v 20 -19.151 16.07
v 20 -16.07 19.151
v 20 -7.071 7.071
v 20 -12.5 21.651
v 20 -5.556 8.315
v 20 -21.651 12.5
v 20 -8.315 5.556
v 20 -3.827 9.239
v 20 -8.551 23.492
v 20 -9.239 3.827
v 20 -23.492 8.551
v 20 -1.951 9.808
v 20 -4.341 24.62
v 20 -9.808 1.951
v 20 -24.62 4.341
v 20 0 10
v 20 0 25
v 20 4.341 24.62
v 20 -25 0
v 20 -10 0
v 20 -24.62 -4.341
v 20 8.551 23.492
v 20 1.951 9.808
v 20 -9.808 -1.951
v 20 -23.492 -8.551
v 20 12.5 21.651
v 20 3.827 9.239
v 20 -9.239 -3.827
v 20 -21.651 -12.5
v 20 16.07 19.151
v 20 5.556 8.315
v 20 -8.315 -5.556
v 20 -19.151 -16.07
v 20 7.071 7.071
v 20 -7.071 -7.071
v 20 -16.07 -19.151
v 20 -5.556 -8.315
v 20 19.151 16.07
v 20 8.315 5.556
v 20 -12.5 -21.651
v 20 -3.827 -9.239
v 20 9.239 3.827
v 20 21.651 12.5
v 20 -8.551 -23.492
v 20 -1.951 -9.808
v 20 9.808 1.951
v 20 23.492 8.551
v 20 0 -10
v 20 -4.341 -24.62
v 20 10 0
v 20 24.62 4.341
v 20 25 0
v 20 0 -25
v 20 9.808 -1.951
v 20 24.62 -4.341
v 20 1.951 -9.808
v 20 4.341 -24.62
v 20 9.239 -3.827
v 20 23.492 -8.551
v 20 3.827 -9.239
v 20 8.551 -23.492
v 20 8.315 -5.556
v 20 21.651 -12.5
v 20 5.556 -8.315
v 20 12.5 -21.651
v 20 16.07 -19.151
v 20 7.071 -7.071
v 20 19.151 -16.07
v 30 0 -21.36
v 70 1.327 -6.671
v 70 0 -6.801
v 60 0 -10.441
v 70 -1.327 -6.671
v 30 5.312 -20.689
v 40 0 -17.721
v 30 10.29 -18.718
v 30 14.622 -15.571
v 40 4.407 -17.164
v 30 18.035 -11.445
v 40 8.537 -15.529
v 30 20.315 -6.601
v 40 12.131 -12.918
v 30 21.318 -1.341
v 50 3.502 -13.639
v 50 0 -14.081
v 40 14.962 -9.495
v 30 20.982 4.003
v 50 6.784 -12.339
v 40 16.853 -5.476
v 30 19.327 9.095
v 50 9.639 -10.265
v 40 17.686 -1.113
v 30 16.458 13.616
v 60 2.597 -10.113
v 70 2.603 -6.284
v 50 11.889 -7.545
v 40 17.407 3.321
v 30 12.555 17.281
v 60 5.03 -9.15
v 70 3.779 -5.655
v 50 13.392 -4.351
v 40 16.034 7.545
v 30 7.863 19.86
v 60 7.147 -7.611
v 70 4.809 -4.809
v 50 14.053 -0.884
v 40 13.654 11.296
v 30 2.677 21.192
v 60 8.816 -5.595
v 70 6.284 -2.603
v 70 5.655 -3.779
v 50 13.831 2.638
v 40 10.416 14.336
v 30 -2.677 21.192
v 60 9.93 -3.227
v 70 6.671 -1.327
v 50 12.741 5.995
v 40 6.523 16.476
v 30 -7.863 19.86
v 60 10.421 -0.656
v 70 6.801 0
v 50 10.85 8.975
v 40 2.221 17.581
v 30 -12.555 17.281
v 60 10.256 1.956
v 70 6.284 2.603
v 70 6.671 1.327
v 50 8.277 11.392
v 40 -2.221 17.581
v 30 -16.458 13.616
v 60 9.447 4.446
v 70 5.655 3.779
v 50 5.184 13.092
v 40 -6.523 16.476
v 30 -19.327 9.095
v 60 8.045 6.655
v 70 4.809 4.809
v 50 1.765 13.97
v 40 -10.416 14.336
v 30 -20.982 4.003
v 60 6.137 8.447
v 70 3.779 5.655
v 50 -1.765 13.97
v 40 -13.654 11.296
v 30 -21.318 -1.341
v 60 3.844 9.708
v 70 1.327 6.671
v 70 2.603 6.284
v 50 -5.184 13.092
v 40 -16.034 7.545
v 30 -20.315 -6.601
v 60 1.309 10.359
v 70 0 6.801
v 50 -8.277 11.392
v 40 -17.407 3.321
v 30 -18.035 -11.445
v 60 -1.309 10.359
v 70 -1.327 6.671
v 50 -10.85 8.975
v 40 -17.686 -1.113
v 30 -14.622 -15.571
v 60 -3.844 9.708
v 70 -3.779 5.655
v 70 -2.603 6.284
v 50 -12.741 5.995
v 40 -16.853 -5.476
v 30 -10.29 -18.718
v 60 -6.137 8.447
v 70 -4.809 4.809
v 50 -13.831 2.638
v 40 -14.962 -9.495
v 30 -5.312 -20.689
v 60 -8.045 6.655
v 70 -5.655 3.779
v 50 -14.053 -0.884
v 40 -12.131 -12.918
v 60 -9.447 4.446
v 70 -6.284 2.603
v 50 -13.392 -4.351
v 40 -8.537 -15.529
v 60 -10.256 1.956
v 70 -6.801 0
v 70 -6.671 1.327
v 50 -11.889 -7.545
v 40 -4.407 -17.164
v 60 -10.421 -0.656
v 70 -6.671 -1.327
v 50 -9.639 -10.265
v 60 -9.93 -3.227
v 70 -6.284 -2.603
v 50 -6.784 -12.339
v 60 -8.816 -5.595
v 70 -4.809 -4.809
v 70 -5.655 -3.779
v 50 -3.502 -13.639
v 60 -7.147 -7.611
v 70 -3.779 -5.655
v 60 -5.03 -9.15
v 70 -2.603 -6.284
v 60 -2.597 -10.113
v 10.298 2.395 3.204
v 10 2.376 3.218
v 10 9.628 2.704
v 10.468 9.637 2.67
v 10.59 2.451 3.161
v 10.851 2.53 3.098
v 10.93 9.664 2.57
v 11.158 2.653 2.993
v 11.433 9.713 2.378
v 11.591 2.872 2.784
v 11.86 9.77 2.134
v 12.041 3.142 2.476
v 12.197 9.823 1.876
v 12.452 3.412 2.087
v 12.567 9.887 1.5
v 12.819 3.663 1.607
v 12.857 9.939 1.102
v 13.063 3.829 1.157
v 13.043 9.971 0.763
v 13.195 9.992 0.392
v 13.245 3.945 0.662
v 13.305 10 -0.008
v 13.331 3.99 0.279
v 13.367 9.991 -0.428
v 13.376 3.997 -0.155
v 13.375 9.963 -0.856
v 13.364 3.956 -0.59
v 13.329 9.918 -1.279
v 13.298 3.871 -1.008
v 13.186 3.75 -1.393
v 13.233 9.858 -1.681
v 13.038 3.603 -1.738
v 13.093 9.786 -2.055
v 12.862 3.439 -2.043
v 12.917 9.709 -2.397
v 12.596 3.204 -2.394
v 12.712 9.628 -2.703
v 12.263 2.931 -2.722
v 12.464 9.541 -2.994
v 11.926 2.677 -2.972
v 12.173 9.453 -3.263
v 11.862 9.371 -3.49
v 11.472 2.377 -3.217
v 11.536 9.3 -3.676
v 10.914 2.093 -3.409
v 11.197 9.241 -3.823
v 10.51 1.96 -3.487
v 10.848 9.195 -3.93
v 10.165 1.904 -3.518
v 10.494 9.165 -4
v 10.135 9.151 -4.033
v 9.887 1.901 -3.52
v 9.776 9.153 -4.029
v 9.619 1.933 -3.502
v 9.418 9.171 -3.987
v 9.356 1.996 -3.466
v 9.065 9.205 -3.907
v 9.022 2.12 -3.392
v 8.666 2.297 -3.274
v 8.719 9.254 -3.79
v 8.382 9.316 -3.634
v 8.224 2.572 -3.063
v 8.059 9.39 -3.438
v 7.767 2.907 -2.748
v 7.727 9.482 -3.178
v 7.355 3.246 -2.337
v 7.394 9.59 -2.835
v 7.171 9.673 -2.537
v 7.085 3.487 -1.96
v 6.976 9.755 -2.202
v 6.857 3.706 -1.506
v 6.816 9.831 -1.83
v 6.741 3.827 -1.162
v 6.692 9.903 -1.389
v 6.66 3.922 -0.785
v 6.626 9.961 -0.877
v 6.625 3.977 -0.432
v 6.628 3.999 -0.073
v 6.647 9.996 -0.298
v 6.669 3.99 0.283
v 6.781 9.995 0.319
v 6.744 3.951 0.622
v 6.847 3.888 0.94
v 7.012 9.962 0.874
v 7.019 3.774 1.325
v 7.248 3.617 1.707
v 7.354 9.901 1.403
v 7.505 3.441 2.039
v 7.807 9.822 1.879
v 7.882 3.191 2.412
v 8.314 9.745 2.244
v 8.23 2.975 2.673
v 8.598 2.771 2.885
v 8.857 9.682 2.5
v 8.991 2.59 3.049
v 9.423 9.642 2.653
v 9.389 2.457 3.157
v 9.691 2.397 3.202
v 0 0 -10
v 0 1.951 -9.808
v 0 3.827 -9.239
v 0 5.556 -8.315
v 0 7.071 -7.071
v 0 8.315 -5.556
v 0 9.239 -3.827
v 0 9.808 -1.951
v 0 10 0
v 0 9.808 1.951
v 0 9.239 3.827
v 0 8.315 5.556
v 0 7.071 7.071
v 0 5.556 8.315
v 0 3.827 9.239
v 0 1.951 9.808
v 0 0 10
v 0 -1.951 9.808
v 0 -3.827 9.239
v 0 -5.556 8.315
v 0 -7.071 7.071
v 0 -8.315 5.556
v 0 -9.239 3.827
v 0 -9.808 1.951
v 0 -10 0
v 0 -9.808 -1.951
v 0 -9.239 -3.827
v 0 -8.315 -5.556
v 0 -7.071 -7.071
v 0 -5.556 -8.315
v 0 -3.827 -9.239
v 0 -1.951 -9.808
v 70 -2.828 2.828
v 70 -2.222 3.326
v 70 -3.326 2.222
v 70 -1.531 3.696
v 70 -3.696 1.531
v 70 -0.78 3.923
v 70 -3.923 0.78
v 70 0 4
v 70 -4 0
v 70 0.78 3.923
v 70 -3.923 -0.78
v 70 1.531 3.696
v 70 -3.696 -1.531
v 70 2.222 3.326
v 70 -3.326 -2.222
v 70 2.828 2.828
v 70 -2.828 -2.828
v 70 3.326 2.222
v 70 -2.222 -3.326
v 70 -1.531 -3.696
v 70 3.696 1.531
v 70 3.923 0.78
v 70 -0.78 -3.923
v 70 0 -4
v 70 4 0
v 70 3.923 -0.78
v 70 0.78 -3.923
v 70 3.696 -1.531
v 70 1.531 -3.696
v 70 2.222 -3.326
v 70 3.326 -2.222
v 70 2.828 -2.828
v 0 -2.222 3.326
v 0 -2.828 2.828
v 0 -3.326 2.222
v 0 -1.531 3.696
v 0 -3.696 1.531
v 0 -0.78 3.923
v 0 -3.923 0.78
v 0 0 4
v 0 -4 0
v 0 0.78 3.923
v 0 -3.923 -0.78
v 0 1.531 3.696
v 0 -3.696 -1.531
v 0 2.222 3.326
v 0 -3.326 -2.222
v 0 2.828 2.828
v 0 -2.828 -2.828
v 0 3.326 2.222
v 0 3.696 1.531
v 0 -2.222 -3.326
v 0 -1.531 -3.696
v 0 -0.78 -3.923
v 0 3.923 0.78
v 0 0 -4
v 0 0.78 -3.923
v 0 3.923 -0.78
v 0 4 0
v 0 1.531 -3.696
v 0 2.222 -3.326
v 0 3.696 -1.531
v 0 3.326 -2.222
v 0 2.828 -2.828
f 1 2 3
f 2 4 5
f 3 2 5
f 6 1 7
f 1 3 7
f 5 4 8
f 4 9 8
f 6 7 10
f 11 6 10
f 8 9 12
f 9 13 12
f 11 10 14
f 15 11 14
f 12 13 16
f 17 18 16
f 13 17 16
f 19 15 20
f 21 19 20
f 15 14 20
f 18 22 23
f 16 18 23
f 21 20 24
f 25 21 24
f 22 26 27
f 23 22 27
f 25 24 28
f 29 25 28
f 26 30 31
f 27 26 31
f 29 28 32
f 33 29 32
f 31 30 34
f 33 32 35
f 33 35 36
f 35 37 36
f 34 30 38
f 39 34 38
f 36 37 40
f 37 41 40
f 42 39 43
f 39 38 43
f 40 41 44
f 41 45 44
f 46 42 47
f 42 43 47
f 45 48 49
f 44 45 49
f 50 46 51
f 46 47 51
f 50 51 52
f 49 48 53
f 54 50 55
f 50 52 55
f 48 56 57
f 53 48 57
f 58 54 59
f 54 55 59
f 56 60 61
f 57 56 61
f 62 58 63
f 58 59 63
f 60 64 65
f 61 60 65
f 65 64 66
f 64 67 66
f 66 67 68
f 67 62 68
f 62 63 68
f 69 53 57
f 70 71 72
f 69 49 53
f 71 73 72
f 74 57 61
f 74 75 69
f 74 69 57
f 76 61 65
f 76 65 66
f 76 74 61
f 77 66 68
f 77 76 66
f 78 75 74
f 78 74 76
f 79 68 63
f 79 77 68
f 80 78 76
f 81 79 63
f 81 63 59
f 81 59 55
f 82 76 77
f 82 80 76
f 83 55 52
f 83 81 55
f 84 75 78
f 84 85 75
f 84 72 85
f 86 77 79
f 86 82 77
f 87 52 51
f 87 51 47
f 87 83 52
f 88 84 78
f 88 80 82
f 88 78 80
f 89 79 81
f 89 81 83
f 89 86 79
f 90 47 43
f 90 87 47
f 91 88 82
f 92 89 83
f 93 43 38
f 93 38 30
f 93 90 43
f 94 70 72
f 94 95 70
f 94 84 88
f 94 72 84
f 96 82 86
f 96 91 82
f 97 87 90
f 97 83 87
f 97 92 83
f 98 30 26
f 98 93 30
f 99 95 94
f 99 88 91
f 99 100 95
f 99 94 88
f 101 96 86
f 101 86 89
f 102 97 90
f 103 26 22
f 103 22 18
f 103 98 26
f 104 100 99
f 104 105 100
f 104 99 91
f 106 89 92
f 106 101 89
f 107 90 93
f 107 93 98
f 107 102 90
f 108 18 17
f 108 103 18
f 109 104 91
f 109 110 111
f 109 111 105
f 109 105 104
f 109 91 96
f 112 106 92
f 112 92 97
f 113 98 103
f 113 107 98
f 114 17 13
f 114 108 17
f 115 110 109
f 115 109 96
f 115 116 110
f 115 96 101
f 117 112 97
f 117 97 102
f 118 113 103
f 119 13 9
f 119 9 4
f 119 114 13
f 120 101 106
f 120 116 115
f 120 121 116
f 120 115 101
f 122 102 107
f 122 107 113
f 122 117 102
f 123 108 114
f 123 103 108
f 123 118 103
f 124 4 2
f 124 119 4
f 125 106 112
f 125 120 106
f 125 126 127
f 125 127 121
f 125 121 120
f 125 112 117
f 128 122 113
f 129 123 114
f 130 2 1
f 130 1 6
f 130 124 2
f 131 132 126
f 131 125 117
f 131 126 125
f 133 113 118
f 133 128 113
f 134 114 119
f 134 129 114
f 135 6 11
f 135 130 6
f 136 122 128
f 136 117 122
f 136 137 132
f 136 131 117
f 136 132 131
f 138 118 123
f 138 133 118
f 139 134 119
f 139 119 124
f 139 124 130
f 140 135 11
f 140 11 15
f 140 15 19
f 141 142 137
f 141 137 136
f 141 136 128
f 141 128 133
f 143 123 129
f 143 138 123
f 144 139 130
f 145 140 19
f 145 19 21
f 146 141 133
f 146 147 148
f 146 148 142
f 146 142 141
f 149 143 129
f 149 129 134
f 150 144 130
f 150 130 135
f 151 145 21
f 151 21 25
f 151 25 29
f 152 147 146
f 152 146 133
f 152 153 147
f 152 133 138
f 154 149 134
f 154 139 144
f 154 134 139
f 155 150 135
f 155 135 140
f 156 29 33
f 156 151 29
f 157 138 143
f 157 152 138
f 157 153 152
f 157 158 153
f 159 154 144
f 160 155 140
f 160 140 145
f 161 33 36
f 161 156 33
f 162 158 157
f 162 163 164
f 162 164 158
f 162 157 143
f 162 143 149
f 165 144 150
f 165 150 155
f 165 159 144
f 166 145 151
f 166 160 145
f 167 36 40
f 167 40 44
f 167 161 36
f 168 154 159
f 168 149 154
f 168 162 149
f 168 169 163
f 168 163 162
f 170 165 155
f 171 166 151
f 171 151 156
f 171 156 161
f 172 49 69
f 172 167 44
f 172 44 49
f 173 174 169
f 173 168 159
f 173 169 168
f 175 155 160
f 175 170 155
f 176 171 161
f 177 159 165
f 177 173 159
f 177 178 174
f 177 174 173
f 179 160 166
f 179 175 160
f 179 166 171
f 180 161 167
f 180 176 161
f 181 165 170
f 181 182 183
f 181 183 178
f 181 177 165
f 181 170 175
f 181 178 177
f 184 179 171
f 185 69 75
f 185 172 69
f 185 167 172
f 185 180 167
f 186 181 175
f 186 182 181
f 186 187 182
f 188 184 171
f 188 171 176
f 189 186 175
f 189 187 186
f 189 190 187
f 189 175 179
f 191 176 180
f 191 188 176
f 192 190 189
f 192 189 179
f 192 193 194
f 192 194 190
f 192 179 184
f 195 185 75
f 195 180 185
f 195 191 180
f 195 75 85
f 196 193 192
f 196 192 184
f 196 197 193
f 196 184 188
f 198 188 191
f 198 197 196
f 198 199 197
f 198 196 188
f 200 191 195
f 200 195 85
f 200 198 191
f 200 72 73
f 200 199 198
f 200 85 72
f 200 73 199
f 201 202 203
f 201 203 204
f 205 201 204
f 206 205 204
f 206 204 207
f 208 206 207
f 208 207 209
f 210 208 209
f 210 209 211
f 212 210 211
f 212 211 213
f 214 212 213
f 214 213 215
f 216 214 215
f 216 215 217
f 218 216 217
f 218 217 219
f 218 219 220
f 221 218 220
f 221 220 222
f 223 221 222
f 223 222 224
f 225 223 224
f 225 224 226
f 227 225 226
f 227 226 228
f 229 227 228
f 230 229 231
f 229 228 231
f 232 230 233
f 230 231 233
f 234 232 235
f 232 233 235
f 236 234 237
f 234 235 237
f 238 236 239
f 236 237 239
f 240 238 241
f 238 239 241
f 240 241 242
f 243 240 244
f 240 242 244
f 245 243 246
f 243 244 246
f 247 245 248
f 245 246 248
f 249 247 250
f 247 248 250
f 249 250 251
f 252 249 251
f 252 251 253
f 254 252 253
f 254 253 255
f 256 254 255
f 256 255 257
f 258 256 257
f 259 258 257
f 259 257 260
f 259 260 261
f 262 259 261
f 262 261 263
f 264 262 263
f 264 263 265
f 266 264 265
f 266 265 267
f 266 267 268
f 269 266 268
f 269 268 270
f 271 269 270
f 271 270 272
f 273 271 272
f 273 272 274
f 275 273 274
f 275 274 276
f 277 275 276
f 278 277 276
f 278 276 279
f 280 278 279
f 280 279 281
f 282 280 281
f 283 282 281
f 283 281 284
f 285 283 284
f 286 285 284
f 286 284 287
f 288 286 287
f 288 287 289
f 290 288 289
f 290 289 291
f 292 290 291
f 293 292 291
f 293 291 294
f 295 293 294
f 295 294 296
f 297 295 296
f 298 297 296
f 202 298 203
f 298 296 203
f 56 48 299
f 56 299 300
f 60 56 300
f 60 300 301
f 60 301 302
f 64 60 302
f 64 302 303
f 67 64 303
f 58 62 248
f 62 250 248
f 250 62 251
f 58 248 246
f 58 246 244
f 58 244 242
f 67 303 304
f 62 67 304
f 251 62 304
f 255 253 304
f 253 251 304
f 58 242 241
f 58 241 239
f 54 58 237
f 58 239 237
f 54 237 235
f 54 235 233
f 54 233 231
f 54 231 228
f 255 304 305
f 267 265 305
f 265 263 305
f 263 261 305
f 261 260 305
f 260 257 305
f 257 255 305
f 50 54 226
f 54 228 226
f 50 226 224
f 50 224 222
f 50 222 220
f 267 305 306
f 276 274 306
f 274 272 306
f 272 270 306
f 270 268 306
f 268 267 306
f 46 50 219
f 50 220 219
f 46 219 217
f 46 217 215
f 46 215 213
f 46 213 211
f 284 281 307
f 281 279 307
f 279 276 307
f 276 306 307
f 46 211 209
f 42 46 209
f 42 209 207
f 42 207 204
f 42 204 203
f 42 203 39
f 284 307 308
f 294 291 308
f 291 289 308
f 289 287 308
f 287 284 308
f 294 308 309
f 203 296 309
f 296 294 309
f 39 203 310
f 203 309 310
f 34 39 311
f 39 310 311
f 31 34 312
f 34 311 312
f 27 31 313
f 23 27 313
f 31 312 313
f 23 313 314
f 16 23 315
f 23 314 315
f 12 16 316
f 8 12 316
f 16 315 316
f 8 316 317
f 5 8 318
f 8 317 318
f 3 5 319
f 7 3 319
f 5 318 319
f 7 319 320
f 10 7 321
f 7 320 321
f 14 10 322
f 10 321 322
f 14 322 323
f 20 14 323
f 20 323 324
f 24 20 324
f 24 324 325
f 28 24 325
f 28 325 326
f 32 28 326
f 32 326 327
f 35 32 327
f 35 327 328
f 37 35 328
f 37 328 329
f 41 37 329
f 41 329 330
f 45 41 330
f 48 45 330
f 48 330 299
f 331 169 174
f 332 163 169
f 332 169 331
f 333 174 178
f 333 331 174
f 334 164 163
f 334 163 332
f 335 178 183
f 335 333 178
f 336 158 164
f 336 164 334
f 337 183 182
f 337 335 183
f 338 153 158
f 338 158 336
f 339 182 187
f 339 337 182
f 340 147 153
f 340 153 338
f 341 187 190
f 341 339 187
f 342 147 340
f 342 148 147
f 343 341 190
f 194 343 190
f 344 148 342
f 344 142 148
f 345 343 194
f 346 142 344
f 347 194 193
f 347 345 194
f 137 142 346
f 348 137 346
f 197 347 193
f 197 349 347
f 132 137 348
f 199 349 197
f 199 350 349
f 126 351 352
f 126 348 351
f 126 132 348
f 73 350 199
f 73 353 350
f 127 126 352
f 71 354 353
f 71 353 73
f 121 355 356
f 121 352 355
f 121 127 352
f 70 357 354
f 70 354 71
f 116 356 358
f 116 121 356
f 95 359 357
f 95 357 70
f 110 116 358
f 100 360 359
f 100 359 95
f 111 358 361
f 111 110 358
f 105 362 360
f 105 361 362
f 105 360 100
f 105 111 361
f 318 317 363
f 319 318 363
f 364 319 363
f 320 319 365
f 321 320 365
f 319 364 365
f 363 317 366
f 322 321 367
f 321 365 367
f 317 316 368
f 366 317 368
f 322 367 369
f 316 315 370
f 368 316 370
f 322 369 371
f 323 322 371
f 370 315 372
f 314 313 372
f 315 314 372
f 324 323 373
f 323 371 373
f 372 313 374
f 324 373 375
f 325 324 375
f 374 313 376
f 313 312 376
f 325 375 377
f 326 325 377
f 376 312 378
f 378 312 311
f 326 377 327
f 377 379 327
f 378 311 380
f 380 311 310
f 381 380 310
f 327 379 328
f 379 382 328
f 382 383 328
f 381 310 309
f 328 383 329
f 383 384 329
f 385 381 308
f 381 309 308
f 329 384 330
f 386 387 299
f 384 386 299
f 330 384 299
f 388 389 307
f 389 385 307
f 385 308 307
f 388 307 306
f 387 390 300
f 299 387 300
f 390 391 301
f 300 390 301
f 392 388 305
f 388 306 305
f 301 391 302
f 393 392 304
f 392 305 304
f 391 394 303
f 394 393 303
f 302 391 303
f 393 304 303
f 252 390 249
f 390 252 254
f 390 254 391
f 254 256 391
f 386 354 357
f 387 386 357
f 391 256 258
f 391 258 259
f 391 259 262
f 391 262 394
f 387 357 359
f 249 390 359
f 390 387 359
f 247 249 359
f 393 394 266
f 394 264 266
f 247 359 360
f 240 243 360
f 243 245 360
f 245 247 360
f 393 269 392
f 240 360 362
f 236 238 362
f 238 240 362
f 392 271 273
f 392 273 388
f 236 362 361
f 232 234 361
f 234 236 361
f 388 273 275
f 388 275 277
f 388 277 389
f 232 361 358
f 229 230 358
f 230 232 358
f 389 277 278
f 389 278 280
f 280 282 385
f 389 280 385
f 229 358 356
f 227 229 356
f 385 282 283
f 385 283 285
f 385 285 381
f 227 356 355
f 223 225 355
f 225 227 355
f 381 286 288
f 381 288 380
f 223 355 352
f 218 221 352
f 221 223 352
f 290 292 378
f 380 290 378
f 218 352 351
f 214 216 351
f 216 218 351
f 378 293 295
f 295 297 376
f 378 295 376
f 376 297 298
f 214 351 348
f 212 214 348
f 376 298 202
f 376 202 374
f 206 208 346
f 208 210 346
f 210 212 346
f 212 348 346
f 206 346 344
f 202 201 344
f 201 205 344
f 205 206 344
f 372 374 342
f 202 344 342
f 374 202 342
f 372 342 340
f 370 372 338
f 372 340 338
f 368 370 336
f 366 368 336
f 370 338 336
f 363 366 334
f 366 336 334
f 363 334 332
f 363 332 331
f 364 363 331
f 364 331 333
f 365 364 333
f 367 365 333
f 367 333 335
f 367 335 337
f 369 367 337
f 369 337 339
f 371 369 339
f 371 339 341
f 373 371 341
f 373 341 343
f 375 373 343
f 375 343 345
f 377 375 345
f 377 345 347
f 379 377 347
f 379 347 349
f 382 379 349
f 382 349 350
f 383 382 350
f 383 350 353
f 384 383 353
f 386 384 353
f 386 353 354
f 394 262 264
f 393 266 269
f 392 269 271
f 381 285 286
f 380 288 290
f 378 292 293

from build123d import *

# Parameters (mm, degrees)
CROQUIS1_R                         = 10
SALIENTE_EXTRUIR1_DEPTH            = 20
CROQUIS2_R                         = 25
SALIENTE_EXTRUIR2_DEPTH            = 50
SALIENTE_EXTRUIR2_TAPER            = 20
CROQUIS3_R                         = 4
CORTAR_EXTRUIR2_DEPTH              = 70
TALADRO_DE_MARGEN_PARA_1_41_REACH  = 76.055
TALADRO_DE_MARGEN_PARA_1_41_BORE_R = 3.3782


with BuildPart() as part:
    # Croquis1 → Saliente-Extruir1 (new body)
    with BuildSketch(Plane(origin=(0, 0, 0), x_dir=(0, 0, -1), z_dir=(1, 0, 0))):
        Circle(CROQUIS1_R)
    extrude(amount=SALIENTE_EXTRUIR1_DEPTH)

    # Croquis2 → Saliente-Extruir2 (add)
    with BuildSketch(Plane(origin=(20, 0, 0), x_dir=(0, 0, -1), z_dir=(1, 0, 0))):
        Circle(CROQUIS2_R)
    extrude(amount=SALIENTE_EXTRUIR2_DEPTH, taper=SALIENTE_EXTRUIR2_TAPER)

    # Croquis3 → Cortar-Extruir2 (cut)
    with BuildSketch(Plane(origin=(70, 0, 0), x_dir=(0, 0, -1), z_dir=(1, 0, 0))):
        Circle(CROQUIS3_R)
    extrude(amount=-CORTAR_EXTRUIR2_DEPTH, mode=Mode.SUBTRACT)

    # Taladro de margen para 1/41 bore (on position points) → Taladro de margen para 1/41 (cut, up to next)
    with BuildSketch(Plane(origin=(10, 9.974931901, -0.707625302), x_dir=(0, 0.070762530204, 0.997493190112), z_dir=(0, 0.997493190112, -0.070762530204)), mode=Mode.PRIVATE) as taladro_de_margen_para_1_41_sk1:
        Circle(TALADRO_DE_MARGEN_PARA_1_41_BORE_R)
    taladro_de_margen_para_1_41_tool1 = extrude(taladro_de_margen_para_1_41_sk1.sketch, amount=-TALADRO_DE_MARGEN_PARA_1_41_REACH, mode=Mode.PRIVATE) & part.part
    add(taladro_de_margen_para_1_41_tool1.solids().sort_by_distance((10, 9.974932, -0.707625))[0], mode=Mode.SUBTRACT)


solid = part.part
